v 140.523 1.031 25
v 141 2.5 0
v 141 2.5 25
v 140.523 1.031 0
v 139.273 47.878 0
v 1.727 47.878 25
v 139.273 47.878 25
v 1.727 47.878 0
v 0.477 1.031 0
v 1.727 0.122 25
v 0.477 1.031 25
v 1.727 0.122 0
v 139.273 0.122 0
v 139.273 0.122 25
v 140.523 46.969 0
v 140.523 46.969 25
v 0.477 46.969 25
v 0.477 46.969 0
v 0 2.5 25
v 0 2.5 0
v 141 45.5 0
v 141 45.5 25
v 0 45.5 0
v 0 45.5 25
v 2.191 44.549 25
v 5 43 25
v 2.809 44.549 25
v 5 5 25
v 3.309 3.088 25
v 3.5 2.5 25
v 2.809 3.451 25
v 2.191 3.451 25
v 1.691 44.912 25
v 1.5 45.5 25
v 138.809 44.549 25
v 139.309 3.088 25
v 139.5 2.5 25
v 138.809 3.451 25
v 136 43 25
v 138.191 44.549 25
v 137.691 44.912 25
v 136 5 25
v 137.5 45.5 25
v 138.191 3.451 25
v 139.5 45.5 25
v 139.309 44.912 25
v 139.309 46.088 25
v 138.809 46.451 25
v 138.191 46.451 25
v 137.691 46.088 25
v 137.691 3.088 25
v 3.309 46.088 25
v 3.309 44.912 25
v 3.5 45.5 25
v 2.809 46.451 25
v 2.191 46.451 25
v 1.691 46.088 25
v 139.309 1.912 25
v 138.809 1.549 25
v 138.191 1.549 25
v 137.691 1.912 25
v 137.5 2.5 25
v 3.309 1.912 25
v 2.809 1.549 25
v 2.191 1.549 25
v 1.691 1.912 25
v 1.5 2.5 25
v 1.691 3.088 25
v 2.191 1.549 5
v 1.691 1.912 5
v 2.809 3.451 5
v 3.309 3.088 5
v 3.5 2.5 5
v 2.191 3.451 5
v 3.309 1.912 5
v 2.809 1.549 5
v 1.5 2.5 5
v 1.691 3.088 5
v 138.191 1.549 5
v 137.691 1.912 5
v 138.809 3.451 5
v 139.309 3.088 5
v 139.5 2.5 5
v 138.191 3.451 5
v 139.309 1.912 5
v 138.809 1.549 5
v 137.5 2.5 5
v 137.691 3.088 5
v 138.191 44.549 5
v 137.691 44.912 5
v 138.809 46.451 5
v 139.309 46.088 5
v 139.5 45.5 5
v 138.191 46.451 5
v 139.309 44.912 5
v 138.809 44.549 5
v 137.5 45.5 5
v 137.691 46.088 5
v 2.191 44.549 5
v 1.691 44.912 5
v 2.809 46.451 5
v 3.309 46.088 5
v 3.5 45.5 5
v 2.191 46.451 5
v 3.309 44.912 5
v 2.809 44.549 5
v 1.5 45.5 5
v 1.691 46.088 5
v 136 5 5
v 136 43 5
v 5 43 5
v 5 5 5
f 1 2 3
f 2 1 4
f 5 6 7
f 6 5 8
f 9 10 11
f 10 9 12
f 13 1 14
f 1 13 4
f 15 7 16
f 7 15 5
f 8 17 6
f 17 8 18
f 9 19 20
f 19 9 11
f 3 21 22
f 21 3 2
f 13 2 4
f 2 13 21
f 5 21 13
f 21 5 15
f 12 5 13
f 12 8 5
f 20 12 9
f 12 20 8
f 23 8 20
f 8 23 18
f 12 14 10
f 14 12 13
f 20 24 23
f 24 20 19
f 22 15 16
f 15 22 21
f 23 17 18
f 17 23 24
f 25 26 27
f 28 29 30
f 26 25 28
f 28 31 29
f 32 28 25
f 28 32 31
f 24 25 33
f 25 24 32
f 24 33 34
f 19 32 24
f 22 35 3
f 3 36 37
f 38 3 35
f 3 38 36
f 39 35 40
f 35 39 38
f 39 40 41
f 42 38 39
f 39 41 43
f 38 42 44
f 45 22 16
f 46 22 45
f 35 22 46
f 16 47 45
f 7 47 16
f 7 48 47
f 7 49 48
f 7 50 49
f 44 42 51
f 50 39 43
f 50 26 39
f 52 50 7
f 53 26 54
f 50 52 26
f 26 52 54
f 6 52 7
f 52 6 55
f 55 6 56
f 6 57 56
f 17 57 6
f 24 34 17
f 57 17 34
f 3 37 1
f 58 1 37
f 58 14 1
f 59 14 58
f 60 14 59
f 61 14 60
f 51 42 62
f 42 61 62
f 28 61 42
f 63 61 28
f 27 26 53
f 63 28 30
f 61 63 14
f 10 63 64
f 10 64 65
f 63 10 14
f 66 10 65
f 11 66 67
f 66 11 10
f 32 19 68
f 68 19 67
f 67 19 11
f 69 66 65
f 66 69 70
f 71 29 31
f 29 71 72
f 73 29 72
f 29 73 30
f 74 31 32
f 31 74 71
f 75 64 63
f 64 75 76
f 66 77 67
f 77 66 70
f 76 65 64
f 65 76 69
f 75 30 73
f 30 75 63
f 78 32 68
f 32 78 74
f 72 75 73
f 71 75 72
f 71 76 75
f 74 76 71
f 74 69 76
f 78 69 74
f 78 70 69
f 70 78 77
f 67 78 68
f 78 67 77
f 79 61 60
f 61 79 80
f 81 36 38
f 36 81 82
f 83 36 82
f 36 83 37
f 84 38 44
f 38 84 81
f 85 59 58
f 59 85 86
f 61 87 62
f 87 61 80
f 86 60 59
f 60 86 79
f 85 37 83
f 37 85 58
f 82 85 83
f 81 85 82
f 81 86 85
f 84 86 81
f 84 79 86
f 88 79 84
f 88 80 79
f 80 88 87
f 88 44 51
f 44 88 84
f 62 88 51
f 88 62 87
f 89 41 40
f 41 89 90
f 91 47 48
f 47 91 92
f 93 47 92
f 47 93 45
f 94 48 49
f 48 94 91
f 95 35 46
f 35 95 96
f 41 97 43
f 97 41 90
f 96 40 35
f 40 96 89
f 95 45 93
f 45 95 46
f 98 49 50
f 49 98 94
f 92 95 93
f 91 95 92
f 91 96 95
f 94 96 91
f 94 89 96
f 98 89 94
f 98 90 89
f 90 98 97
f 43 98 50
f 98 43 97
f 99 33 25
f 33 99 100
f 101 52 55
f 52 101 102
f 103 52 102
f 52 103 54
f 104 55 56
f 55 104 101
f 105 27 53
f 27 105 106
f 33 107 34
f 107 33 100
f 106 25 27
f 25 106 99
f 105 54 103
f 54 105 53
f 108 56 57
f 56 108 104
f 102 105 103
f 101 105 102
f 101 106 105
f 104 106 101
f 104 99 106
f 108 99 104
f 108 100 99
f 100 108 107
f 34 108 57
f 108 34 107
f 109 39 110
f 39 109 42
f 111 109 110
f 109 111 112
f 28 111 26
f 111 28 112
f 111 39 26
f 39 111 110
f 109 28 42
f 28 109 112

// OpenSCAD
ledD=5;
h = 25;
fn = 10;
dd = 5;

difference() {
    union() {
        hull() {
            translate([dd/2, dd/2, 0]) cylinder(d = dd, h = h, $fn = fn); 
            translate([141 - dd/2, dd/2, 0]) cylinder(d = dd, h = h, $fn = fn); 
            translate([141 - dd/2, 48 - dd/2, 0]) cylinder(d = dd, h = h, $fn = fn); 
            translate([dd/2, 48 - dd/2, 0]) cylinder(d = dd, h = h, $fn = fn); 
        }
    }
    
    translate([dd/2, dd/2, 5]) cylinder(d = 2, h = h, $fn = fn); 
    translate([141 - dd/2, dd/2, 5]) cylinder(d = 2, h = h, $fn = fn); 
    translate([141 - dd/2, 48 - dd/2, 5]) cylinder(d = 2, h = h, $fn = fn); 
    translate([dd/2, 48 - dd/2, 5]) cylinder(d = 2, h = h, $fn = fn); 
    translate([dd, dd, 5]) cube([141 - 2*dd, 48 - 2*dd, h]);
}
